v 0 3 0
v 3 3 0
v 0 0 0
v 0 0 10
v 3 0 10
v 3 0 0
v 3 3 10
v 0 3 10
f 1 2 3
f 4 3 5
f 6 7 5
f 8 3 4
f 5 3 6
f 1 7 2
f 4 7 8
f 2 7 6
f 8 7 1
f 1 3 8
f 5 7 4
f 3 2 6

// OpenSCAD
$fn=7;
hull()
{
	translate([0,0,0])
	{
		rotate(0,[0,0,1])
		{
			cube([3,3,3]);
		}
	}
	translate([0,0,7])
	{
		rotate(0,[0,0,1])
		{
			cube([3,3,3]);
		}
	}
}
